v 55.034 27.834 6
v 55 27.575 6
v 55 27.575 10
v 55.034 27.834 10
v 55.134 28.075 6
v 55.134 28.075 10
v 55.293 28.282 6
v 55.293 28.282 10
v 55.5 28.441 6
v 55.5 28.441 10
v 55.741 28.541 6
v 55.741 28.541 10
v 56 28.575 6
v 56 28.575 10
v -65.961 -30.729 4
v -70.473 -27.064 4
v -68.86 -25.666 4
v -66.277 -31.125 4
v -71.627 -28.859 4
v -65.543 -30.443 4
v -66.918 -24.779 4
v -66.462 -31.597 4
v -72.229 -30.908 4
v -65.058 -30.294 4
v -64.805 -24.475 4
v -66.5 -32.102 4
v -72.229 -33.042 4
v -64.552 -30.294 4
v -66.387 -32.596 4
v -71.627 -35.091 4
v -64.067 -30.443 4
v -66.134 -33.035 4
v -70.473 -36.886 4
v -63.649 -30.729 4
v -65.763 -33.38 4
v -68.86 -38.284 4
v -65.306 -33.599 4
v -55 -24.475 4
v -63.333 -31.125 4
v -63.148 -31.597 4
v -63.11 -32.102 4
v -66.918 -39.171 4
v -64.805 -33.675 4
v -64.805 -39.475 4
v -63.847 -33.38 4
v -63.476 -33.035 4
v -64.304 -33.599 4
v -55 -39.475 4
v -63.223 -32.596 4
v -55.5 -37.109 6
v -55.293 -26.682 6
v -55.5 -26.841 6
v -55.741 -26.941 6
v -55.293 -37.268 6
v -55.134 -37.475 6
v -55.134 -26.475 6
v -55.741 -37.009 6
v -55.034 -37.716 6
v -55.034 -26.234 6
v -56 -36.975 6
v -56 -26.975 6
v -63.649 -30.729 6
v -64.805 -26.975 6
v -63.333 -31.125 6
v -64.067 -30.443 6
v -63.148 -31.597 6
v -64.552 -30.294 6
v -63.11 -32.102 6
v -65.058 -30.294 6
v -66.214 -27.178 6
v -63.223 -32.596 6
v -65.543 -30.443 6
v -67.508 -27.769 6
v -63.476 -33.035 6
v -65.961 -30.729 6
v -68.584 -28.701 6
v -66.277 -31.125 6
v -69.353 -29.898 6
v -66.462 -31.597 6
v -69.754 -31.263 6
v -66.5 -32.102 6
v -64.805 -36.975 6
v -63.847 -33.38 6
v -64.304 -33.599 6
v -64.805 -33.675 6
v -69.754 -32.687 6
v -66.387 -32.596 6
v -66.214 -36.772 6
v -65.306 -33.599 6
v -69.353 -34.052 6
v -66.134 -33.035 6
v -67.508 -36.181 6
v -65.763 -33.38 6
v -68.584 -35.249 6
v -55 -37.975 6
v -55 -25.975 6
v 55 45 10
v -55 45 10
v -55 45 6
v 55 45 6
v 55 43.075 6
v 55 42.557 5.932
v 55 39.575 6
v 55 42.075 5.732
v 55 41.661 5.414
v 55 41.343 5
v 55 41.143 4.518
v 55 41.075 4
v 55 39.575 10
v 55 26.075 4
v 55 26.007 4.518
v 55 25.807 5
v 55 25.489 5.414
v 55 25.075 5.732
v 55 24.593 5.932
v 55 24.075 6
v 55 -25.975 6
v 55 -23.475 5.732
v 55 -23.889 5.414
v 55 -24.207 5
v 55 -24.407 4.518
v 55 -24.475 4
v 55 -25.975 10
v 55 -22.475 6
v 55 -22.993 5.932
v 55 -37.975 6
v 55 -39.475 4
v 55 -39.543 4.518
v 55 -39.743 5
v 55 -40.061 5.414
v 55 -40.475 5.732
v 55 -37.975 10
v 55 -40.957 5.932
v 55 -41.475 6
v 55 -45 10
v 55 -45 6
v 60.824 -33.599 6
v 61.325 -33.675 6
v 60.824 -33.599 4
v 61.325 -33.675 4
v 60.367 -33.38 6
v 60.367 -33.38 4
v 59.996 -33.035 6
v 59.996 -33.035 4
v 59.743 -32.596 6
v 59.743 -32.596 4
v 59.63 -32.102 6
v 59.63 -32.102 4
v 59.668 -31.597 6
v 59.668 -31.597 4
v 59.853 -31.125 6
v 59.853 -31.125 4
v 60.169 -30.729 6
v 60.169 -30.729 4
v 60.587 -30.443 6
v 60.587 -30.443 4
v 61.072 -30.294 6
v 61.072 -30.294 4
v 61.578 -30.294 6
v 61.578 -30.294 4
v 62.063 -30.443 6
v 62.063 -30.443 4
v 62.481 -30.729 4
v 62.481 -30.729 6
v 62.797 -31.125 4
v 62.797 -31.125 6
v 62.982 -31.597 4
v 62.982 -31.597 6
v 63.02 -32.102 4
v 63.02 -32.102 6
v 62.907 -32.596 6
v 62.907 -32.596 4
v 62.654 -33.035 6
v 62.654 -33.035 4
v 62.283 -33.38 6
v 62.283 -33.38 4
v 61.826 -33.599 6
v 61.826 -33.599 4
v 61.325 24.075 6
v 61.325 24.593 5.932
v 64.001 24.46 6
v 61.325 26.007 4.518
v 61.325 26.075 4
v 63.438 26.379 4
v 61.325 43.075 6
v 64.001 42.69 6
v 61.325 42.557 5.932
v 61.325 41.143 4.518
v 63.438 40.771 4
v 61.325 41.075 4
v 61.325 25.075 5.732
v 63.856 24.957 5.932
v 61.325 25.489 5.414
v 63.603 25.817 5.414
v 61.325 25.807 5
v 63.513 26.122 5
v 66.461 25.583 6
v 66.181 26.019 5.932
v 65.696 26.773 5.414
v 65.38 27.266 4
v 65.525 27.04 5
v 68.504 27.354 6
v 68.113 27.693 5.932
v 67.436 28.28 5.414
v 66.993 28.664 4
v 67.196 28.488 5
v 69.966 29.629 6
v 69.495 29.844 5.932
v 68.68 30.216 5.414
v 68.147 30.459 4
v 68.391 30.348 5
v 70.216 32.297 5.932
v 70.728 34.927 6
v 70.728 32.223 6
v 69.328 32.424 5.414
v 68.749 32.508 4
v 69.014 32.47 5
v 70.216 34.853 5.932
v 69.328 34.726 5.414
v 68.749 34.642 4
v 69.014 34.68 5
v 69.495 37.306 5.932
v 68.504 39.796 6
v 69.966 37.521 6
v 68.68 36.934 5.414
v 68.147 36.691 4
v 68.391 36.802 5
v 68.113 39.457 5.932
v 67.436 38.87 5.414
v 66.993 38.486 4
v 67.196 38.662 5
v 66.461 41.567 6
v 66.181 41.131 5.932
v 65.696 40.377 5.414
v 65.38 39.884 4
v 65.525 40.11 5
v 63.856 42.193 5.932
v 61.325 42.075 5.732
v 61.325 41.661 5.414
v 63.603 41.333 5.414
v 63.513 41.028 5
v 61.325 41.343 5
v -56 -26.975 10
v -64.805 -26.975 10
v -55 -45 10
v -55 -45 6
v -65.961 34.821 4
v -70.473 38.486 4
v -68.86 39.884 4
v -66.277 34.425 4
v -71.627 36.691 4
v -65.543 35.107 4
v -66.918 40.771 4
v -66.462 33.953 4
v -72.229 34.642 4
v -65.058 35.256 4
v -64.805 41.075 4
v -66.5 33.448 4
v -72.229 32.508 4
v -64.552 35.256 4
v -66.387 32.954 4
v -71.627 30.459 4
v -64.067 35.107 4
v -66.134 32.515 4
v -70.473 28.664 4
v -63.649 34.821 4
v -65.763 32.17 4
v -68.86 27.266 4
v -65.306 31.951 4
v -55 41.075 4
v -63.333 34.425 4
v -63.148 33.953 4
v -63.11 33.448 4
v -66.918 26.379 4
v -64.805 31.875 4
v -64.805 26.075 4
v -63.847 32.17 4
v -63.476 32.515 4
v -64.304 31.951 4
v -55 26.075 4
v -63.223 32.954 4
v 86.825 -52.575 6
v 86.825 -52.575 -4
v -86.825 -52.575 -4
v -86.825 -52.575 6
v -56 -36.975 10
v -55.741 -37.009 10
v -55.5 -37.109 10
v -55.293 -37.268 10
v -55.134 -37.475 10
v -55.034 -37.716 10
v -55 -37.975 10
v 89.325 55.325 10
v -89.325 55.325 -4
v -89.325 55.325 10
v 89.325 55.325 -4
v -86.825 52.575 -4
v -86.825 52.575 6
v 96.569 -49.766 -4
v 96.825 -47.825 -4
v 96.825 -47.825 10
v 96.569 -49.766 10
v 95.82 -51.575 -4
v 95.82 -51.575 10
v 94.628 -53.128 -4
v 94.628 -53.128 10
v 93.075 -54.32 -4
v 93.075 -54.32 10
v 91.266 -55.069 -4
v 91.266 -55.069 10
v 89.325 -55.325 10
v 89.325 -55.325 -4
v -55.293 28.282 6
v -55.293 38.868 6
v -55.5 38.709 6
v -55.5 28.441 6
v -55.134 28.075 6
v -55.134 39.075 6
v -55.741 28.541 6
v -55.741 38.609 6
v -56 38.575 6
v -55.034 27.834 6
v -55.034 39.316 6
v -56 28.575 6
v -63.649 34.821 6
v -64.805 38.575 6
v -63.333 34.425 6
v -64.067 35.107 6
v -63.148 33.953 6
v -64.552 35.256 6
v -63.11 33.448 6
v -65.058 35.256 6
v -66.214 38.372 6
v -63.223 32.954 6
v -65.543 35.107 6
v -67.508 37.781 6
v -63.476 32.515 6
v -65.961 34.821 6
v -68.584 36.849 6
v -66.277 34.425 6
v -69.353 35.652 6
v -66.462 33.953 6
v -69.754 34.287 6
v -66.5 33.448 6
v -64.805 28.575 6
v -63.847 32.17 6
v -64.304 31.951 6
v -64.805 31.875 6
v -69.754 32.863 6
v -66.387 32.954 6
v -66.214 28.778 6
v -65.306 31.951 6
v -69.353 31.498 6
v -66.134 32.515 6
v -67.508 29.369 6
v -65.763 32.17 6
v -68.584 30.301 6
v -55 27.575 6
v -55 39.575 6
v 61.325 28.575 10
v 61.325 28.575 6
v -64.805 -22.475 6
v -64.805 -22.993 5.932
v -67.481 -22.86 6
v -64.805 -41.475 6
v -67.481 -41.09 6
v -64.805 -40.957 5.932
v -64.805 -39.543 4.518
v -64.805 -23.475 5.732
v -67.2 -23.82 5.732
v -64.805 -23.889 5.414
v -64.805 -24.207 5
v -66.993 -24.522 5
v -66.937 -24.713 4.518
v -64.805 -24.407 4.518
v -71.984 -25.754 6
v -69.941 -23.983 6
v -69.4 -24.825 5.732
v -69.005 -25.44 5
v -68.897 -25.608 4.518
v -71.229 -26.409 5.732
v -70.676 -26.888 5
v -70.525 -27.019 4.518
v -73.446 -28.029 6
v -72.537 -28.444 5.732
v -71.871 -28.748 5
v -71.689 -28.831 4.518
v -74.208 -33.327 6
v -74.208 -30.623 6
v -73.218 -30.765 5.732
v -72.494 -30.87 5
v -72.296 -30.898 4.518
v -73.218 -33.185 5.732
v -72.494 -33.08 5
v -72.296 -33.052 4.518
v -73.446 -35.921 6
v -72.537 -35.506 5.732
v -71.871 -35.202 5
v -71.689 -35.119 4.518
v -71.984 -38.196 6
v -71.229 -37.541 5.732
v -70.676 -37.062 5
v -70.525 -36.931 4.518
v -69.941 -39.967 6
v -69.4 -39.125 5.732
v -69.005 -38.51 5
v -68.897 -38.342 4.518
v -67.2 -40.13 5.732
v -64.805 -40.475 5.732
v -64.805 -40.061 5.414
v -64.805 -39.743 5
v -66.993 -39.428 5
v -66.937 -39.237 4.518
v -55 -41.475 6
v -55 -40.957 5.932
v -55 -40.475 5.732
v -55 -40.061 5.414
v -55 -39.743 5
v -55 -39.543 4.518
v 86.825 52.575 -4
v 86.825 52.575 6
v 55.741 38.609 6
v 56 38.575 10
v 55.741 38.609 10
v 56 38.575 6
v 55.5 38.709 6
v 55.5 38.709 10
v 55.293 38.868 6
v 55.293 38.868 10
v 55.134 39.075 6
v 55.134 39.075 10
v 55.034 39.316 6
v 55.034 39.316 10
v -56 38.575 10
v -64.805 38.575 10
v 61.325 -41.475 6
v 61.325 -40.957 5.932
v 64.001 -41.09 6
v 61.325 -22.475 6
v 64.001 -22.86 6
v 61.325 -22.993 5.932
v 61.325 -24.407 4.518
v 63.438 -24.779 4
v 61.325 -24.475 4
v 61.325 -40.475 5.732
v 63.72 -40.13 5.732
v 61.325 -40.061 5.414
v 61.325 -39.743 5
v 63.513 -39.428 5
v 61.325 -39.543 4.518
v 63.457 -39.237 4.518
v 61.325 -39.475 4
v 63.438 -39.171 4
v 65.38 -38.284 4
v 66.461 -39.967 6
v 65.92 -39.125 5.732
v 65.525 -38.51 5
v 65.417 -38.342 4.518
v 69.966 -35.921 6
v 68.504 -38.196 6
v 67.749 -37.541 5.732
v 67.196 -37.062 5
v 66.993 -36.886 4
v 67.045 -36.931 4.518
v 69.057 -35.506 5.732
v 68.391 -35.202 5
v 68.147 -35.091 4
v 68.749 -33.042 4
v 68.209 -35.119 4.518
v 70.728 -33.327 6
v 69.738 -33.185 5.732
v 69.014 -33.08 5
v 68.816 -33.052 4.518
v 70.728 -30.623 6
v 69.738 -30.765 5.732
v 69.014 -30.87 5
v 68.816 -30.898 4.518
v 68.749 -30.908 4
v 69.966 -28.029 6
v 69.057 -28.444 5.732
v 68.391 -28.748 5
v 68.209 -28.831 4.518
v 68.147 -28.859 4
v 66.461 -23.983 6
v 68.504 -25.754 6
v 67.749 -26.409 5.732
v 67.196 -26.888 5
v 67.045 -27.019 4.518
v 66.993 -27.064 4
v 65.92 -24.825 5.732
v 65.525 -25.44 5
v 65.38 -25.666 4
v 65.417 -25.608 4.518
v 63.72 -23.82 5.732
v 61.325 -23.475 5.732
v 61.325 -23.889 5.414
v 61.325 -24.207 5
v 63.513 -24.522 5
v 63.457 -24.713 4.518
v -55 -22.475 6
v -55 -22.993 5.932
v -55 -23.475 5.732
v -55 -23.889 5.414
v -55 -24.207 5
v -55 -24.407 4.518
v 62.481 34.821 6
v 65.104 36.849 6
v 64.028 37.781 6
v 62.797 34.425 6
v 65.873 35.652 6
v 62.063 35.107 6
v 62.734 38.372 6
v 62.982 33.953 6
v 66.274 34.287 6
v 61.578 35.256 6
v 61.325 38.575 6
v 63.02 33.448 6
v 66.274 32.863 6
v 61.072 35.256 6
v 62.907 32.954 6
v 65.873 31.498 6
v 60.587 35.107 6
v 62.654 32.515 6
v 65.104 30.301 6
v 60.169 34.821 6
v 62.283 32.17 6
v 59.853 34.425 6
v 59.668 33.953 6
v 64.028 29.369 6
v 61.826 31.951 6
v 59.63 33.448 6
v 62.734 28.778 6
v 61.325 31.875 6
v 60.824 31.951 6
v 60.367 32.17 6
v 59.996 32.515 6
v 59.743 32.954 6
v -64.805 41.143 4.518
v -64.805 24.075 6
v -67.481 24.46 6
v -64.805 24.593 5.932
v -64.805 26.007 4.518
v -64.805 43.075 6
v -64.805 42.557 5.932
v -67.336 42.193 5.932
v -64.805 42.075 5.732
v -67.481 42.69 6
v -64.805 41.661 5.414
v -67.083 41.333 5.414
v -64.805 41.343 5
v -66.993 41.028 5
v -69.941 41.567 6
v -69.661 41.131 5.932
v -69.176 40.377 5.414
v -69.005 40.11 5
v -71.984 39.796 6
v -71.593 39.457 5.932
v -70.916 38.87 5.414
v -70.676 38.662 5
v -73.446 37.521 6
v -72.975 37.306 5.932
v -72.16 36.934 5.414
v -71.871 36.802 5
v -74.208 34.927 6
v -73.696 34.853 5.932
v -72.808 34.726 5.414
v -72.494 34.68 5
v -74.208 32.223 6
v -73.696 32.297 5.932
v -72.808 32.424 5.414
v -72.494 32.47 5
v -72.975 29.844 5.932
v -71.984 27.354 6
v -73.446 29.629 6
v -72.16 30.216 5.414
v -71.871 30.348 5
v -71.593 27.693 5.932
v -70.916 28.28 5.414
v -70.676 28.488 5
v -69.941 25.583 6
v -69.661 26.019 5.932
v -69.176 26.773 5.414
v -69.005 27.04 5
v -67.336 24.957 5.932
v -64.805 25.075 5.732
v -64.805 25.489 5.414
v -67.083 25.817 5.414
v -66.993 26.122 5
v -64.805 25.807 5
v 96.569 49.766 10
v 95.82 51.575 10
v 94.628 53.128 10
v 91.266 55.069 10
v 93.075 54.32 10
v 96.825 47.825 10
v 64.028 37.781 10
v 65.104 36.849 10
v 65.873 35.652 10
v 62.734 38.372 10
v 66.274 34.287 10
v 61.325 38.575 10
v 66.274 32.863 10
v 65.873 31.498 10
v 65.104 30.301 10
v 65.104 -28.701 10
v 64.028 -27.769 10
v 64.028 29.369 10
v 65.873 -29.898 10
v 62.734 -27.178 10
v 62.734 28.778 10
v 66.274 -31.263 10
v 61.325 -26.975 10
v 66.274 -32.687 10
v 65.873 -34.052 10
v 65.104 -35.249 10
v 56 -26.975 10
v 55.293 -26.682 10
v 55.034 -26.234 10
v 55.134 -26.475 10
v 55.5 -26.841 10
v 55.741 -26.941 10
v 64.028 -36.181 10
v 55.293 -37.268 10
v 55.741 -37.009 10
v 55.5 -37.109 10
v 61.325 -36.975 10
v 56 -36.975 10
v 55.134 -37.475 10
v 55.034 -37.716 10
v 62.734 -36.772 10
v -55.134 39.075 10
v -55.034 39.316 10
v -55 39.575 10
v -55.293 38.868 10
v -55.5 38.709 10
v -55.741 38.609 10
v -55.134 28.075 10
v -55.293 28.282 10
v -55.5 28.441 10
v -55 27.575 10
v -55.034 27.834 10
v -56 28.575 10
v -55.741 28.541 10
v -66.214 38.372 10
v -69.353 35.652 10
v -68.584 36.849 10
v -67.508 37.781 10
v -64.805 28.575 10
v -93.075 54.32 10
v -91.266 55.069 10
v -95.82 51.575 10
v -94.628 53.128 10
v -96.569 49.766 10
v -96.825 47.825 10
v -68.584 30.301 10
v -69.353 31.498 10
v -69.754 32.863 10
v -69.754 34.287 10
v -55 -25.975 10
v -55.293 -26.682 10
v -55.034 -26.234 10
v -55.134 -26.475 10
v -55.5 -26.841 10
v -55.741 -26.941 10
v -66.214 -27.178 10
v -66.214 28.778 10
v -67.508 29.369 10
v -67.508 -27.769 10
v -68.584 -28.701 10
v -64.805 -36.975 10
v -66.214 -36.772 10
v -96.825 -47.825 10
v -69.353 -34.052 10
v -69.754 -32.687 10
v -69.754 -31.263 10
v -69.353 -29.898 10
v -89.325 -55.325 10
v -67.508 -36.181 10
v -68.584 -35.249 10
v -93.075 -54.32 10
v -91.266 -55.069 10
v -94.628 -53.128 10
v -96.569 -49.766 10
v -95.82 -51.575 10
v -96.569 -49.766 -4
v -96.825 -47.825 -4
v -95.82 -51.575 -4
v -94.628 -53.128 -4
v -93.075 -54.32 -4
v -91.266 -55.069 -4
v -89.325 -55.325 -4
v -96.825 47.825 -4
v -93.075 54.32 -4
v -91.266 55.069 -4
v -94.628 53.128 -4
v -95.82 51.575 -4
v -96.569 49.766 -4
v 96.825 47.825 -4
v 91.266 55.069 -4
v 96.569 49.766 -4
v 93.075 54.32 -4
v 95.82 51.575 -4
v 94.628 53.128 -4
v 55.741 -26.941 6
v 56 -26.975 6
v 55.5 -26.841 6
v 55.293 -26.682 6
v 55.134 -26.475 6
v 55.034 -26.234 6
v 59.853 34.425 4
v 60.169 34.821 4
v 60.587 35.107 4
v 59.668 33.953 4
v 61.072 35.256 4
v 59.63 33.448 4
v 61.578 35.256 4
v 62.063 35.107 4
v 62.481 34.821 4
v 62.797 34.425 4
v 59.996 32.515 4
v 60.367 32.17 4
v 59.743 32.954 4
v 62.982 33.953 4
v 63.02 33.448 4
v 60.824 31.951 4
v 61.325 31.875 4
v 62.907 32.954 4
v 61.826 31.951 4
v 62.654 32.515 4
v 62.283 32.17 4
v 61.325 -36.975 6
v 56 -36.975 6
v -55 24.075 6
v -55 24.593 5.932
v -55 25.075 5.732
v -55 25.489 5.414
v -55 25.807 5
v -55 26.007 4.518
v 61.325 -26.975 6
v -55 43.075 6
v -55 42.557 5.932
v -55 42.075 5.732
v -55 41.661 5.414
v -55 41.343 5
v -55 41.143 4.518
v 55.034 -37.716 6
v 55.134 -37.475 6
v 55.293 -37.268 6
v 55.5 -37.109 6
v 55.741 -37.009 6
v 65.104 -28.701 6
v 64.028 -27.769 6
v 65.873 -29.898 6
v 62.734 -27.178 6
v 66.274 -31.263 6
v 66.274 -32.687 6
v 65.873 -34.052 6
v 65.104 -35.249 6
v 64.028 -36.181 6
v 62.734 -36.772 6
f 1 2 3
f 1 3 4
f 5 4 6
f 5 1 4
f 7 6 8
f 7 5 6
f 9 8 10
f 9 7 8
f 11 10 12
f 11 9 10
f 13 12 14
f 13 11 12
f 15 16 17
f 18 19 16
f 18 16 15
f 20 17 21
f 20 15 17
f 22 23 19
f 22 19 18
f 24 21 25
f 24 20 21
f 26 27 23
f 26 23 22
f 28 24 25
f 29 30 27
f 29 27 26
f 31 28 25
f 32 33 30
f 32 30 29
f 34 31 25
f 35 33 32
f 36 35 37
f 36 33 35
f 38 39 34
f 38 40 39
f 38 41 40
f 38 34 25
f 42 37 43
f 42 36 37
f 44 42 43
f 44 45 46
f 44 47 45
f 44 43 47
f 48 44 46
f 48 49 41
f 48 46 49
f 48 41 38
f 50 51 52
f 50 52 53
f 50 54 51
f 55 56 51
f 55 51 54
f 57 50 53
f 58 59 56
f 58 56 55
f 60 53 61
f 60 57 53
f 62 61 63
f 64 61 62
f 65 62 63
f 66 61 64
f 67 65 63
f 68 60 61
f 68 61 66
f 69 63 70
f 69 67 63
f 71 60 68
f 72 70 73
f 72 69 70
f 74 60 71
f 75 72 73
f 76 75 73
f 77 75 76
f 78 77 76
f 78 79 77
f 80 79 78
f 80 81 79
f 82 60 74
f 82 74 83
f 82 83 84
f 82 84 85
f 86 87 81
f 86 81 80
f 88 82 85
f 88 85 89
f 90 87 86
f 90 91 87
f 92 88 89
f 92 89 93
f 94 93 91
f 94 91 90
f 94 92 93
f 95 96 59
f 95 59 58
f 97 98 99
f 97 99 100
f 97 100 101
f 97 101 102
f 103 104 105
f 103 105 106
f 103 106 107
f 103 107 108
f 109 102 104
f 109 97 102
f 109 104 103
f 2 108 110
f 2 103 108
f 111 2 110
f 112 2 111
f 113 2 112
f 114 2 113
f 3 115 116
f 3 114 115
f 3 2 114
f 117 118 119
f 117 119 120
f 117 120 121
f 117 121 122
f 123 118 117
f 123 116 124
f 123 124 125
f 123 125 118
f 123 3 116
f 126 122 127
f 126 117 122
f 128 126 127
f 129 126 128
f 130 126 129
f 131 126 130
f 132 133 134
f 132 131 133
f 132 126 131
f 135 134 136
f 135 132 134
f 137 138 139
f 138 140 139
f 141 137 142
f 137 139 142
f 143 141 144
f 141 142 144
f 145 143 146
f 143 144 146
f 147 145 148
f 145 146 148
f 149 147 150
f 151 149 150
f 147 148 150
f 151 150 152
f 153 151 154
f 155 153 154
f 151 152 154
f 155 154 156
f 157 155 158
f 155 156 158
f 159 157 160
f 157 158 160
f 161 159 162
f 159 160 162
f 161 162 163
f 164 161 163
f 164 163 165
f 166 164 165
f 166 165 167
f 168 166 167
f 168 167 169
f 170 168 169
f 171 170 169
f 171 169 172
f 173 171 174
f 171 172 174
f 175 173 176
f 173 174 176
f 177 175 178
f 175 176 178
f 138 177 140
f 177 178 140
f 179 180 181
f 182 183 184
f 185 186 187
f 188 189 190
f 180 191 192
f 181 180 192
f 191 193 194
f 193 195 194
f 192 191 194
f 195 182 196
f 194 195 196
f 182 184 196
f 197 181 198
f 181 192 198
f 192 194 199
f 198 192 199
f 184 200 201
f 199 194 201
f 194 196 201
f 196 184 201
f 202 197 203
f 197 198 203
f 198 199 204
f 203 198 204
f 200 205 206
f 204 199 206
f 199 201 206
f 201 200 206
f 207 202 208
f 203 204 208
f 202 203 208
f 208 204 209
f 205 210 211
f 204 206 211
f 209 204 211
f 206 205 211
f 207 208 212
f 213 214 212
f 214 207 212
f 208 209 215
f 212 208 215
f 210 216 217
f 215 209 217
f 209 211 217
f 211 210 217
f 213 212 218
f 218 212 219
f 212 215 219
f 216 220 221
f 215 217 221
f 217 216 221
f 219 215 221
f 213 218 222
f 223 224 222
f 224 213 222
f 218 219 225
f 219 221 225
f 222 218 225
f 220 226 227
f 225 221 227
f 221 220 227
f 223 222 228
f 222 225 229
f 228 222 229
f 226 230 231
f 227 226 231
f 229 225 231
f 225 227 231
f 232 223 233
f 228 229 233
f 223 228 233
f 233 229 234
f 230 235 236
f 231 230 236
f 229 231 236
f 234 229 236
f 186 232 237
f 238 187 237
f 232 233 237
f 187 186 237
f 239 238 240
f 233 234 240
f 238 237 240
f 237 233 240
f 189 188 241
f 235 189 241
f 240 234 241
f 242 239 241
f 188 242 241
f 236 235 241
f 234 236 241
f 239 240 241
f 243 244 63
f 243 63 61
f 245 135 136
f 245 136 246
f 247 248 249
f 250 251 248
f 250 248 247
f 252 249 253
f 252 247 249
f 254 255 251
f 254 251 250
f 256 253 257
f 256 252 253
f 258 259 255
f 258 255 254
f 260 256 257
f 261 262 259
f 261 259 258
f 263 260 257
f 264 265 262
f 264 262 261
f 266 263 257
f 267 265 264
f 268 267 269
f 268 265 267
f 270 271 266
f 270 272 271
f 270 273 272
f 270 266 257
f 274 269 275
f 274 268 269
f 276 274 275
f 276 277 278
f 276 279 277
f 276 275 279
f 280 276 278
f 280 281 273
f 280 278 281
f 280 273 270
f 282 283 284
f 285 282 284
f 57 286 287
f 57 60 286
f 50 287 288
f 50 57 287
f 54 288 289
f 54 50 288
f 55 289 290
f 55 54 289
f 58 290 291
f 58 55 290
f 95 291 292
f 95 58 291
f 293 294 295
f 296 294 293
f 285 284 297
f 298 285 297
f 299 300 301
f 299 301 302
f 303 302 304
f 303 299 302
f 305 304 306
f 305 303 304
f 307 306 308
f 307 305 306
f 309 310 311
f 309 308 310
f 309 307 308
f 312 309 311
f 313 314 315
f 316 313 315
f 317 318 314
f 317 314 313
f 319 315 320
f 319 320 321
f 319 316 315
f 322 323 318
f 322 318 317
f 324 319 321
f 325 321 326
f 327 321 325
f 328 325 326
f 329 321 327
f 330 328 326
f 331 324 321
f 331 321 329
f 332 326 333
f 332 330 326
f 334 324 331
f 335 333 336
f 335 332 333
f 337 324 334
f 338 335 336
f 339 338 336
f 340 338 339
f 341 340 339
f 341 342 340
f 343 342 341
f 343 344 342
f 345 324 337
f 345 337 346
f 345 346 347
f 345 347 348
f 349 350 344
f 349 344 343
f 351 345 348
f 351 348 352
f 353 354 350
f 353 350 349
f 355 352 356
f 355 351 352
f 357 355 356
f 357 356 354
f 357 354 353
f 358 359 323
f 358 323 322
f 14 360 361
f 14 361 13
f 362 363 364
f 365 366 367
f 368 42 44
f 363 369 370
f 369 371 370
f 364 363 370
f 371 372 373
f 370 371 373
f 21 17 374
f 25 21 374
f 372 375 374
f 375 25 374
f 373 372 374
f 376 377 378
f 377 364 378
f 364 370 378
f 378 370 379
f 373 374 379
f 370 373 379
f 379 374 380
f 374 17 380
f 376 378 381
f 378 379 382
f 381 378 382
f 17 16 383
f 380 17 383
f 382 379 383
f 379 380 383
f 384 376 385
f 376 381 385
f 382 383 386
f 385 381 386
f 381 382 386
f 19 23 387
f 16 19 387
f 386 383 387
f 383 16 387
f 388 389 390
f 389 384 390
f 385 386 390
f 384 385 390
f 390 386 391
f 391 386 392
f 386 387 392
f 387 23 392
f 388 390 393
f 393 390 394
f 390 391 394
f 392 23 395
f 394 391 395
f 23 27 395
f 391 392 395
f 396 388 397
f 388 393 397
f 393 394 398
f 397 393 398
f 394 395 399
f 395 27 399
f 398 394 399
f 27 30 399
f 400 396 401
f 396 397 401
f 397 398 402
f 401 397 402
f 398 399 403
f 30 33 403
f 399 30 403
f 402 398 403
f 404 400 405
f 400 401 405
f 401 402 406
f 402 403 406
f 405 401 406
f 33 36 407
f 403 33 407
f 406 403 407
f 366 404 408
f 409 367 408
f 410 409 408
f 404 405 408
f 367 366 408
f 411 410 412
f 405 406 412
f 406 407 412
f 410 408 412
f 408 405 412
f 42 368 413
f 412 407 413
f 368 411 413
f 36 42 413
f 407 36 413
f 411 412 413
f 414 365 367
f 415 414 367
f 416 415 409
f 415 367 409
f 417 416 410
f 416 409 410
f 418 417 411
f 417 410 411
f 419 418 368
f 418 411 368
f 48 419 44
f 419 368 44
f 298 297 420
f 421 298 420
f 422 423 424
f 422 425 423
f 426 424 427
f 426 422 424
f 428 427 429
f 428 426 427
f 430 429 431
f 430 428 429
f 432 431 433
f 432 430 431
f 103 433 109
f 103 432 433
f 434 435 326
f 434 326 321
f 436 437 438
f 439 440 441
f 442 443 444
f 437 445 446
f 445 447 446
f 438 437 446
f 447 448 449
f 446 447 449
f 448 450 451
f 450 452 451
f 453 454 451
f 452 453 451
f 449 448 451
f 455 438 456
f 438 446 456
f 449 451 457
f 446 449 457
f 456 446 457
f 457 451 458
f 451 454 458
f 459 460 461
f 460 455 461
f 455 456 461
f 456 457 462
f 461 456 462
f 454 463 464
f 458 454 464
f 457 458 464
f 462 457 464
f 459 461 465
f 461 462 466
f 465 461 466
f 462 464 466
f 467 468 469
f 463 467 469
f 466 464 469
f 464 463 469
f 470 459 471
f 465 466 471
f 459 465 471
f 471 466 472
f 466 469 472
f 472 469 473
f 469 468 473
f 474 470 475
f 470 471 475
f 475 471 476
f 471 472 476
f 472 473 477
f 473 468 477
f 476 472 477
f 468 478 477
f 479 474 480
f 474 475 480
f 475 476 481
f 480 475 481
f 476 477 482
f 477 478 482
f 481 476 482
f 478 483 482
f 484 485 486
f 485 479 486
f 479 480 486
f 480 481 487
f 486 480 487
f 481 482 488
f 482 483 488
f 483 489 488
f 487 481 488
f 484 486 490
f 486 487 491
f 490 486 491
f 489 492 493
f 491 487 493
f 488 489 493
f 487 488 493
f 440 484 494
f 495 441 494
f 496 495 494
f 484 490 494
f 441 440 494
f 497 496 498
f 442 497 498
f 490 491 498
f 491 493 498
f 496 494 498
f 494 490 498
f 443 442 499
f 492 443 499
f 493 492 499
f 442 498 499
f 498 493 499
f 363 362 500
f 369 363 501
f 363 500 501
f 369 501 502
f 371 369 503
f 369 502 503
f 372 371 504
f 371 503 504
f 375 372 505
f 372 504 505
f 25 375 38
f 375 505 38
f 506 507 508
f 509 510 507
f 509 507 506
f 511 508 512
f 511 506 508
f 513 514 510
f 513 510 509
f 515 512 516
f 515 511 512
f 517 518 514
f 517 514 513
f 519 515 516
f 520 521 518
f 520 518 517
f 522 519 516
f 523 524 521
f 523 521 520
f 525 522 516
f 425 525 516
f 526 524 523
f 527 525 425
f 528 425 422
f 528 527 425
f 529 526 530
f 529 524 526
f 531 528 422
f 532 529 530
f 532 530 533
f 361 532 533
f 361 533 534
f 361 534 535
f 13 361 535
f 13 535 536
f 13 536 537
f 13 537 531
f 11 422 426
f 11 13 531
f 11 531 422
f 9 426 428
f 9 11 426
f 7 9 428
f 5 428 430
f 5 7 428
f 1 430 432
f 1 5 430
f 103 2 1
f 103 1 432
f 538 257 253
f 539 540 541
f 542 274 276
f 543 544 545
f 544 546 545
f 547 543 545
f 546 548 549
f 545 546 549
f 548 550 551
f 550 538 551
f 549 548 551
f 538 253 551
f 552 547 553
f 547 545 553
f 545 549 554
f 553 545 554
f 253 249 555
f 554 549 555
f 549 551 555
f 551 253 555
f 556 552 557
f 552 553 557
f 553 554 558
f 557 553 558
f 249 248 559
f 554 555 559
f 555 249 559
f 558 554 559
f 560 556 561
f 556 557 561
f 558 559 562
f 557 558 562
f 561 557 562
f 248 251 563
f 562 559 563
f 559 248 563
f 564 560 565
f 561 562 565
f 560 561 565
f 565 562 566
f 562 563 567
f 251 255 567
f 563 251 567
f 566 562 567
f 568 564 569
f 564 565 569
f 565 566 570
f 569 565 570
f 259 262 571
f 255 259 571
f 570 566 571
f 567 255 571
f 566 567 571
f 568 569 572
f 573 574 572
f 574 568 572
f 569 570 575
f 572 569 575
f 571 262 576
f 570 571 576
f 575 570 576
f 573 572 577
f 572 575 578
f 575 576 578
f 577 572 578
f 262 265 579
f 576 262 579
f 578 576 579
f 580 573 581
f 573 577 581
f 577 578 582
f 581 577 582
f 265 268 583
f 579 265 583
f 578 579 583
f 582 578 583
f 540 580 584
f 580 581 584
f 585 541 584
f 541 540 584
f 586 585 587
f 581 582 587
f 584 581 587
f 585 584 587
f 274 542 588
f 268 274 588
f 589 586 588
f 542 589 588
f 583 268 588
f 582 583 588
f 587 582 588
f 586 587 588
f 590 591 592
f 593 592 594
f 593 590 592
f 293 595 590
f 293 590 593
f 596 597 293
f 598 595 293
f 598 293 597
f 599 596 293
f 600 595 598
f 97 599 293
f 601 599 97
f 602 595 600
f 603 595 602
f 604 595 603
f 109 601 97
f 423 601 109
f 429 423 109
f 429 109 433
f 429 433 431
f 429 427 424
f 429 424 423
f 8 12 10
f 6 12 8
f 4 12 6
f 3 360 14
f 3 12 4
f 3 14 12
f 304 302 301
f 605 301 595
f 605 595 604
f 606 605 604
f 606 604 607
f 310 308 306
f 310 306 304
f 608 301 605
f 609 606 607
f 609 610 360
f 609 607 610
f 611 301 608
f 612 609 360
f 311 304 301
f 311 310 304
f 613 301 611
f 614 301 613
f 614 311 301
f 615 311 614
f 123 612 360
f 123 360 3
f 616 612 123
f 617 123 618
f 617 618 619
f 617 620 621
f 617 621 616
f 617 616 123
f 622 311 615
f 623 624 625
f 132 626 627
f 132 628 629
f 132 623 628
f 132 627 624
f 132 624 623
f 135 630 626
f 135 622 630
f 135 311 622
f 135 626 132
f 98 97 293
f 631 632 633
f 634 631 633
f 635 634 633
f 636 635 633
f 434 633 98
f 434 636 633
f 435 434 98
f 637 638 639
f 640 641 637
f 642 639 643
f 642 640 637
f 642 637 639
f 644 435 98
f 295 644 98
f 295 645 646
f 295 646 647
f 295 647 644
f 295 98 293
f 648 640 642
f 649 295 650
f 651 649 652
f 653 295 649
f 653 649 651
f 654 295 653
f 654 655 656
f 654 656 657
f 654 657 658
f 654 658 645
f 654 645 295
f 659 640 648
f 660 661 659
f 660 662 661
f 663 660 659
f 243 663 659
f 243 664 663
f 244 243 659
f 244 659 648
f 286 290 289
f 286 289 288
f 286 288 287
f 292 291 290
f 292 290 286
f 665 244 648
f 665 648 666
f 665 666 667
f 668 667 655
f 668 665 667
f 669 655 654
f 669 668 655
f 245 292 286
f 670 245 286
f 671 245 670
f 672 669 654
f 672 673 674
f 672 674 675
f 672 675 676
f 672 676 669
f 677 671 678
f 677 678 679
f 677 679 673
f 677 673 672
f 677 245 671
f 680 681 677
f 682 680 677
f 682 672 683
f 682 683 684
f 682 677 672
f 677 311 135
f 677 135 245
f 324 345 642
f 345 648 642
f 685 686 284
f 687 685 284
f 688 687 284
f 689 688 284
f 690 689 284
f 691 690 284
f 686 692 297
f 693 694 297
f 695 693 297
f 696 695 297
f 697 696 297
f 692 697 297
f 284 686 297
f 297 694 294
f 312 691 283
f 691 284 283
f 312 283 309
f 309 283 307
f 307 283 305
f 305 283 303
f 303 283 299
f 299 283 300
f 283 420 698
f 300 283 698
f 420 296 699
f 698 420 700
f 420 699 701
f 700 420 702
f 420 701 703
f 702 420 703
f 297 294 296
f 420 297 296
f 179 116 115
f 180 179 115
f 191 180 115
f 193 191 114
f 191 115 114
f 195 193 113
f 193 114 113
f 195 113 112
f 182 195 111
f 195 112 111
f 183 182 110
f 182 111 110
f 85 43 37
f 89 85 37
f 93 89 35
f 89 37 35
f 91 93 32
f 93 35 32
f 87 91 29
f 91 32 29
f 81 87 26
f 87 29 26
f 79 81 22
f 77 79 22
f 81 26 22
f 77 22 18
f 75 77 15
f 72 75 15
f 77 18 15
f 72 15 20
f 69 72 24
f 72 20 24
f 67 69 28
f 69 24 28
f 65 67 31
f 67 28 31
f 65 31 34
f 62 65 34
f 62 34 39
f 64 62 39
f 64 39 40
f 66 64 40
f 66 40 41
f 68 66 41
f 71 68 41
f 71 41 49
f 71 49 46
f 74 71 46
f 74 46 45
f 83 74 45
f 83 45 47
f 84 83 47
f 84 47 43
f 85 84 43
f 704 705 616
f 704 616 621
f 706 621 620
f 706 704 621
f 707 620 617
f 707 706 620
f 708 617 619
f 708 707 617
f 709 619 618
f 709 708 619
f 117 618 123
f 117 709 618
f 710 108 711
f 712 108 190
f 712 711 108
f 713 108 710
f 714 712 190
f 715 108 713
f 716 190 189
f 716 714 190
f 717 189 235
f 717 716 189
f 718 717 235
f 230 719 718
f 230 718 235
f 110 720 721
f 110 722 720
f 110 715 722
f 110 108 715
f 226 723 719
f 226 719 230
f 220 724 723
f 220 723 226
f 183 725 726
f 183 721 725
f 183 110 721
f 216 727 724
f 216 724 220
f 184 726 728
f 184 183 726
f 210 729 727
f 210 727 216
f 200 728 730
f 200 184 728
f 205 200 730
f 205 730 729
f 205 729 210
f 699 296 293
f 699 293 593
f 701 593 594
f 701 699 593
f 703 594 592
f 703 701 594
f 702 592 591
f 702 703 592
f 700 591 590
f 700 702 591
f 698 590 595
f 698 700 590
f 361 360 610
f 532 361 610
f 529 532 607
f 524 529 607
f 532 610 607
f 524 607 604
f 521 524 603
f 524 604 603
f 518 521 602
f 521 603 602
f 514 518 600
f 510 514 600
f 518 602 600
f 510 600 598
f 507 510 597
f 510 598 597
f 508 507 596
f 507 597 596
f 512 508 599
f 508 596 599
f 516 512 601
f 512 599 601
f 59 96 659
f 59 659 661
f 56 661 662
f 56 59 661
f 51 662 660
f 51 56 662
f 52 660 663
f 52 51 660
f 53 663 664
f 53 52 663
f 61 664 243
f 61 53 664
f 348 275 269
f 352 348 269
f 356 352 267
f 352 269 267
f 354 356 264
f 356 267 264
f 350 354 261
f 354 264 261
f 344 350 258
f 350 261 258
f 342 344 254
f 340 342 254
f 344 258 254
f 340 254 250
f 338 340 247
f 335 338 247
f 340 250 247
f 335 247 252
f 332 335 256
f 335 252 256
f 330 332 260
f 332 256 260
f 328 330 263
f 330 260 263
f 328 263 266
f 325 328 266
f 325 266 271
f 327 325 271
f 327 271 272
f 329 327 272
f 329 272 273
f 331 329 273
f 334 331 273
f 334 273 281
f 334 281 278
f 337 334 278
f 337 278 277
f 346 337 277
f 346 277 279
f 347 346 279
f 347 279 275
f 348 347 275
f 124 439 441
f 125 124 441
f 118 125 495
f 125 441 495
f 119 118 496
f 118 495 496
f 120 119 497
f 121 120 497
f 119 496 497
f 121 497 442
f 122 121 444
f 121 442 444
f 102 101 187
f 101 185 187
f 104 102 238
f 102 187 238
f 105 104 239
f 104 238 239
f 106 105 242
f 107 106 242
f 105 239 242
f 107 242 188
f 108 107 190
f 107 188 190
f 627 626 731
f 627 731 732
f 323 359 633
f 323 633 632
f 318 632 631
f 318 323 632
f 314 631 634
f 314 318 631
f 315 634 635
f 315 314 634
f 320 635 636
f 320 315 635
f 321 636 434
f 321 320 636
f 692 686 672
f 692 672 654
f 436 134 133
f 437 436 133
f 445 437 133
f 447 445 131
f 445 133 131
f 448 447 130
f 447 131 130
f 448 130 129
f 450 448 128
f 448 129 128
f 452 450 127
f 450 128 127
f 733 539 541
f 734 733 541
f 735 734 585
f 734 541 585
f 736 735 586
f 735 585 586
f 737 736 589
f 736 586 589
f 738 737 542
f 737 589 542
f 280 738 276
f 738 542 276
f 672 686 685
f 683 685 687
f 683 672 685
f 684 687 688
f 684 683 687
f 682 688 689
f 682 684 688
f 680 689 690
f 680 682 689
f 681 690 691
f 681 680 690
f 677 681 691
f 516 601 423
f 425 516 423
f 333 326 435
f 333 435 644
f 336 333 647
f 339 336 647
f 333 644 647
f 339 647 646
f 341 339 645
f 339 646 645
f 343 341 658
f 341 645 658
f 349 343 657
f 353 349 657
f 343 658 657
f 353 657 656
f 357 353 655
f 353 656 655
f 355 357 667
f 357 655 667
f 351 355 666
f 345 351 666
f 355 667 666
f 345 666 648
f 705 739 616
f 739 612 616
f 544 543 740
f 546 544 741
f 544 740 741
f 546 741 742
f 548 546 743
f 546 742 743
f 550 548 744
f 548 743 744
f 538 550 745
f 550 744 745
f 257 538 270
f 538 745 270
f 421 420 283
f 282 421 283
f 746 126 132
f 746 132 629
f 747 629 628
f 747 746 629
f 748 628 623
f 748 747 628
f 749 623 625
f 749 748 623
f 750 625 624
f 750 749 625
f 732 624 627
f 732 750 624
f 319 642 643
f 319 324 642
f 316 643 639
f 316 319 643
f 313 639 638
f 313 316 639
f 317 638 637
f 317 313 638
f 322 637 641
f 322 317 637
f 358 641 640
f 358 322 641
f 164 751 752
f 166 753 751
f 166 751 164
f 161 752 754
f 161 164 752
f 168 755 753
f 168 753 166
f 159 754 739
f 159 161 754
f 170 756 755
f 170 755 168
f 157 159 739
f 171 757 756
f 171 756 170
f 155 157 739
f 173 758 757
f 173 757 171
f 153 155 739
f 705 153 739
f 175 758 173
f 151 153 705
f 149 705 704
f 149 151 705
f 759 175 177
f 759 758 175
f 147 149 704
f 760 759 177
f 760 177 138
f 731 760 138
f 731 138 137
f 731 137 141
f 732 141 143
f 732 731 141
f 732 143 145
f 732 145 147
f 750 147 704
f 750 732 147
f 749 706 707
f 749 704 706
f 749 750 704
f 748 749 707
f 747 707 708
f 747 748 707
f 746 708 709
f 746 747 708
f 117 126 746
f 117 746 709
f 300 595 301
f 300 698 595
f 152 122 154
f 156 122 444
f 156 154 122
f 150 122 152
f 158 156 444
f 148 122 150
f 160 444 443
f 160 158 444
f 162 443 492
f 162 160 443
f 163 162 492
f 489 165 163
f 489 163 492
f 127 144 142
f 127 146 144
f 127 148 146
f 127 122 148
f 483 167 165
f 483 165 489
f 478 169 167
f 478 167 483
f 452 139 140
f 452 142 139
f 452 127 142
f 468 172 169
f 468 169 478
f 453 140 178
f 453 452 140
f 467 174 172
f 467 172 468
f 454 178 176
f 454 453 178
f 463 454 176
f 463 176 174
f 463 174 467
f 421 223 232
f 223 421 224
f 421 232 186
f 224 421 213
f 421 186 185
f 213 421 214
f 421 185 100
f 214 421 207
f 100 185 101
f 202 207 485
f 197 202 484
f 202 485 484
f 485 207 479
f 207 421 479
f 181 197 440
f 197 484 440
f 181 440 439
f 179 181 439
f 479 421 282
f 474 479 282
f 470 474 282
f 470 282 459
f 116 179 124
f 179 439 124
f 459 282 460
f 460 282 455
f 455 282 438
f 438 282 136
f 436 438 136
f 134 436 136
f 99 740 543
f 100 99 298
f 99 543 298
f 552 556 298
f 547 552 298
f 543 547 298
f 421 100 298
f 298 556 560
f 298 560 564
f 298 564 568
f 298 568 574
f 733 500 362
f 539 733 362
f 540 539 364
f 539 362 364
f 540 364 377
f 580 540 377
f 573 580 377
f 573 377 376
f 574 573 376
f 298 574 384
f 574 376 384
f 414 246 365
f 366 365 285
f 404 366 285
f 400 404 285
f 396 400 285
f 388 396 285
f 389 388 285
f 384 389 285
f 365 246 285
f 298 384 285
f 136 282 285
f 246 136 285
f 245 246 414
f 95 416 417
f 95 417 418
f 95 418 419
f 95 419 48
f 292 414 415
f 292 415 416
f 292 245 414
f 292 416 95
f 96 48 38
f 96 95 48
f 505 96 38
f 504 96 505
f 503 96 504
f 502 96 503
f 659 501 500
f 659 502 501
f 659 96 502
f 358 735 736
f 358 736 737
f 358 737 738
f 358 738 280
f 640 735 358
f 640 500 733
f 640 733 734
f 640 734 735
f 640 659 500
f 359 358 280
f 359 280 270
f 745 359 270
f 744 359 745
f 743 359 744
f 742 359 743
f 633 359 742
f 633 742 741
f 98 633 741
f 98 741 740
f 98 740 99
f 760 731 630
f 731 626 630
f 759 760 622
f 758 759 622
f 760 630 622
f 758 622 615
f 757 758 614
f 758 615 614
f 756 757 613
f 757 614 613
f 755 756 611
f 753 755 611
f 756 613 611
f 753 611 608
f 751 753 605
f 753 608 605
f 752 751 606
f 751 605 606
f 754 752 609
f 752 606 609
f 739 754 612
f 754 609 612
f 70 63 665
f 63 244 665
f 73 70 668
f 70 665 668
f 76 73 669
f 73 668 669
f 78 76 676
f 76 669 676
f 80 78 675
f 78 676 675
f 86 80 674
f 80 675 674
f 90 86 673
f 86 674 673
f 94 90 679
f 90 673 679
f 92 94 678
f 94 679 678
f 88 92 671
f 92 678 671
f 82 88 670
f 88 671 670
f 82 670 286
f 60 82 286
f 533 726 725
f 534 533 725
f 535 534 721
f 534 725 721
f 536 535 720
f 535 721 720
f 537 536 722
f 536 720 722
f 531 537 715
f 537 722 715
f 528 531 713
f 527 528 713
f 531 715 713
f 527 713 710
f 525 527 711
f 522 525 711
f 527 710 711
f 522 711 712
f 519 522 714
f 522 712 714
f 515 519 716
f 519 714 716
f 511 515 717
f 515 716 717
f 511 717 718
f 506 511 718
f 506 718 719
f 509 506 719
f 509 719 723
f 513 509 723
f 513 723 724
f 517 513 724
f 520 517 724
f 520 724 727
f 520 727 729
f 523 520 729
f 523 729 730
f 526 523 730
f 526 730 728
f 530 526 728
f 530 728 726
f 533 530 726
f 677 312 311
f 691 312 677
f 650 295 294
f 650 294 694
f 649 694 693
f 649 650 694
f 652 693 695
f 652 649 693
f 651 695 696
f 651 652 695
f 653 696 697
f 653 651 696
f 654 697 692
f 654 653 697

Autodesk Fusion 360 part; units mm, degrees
sketch "Sketch1" plane through (0, 0, 0) normal (0, 0, 1) x (1, 0, 0)
  line L0 (-96.825, 55.325) -> (96.825, 55.325)
  line L1 (96.825, 55.325) -> (96.825, -55.325)
  line L2 (96.825, -55.325) -> (-96.825, -55.325)
  line L3 (-96.825, -55.325) -> (-96.825, 55.325)
  line L4 (-86.825, 52.575) -> (86.825, 52.575)
  line L5 (86.825, 52.575) -> (86.825, -52.575)
  line L6 (86.825, -52.575) -> (-86.825, -52.575)
  line L7 (-86.825, -52.575) -> (-86.825, 52.575)
  point P0 (0, 55.325)
  point P1 (96.825, 0)
  point P2 (0, 52.575)
  point P3 (86.825, 0)
  dimension "d1" = 193.65
  dimension "d2" = 110.65
  dimension "d9" = 2.75
  dimension "d10" = 10
extrude "Extrude2" add sketch "Sketch1" along normal mid plane 8
fillet "Fillet1" radius 7.5 4 edges at (-96.825, 55.325, 0) (-96.825, -55.325, 0) (96.825, -55.325, 0) (96.825, 55.325, 0)
sketch "Sketch2" plane through (0, 0, 4) normal (0, 0, 1) x (-1, 0, 0)
  arc A0 (-96.825, -47.825) -> (-89.325, -55.325) centre (-89.325, -47.825) ccw
  line L0 (-89.325, -55.325) -> (89.325, -55.325)
  arc A1 (89.325, -55.325) -> (96.825, -47.825) centre (89.325, -47.825) ccw
  line L1 (96.825, -47.825) -> (96.825, 47.825)
  arc A2 (96.825, 47.825) -> (89.325, 55.325) centre (89.325, 47.825) ccw
  line L2 (89.325, 55.325) -> (-89.325, 55.325)
  arc A3 (-89.325, 55.325) -> (-96.825, 47.825) centre (-89.325, 47.825) ccw
  line L3 (-96.825, 47.825) -> (-96.825, -47.825)
  line L4 (-86.825, 52.575) -> (86.825, 52.575)
  line L5 (86.825, 52.575) -> (86.825, -52.575)
  line L6 (86.825, -52.575) -> (-86.825, -52.575)
  line L7 (-86.825, -52.575) -> (-86.825, 52.575)
  line L8 (96.825, -47.825) -> (96.825, 47.825)
  arc A4 (96.825, 47.825) -> (89.325, 55.325) centre (89.325, 47.825) ccw
  line L9 (89.325, 55.325) -> (-89.325, 55.325)
  arc A5 (-89.325, 55.325) -> (-96.825, 47.825) centre (-89.325, 47.825) ccw
  line L10 (-96.825, 47.825) -> (-96.825, -47.825)
  arc A6 (-96.825, -47.825) -> (-89.325, -55.325) centre (-89.325, -47.825) ccw
  line L11 (-89.325, -55.325) -> (89.325, -55.325)
  arc A7 (89.325, -55.325) -> (96.825, -47.825) centre (89.325, -47.825) ccw
extrude "Extrude3" add sketch "Sketch2" along normal blind 6 contours A0 L0 A1 L1 A2 L2 A3 L3 L8 A4 L9 A5 L10 A6 L11 A7 | L4 L5 L6 L7
sketch "Sketch3" plane through (0, 0, 10) normal (0, 0, 1) x (-1, 0, 0)
  arc A0 (89.325, -55.325) -> (96.825, -47.825) centre (89.325, -47.825) ccw
  line L0 (96.825, -47.825) -> (96.825, 47.825)
  arc A1 (96.825, 47.825) -> (89.325, 55.325) centre (89.325, 47.825) ccw
  line L1 (89.325, 55.325) -> (-89.325, 55.325)
  arc A2 (-89.325, 55.325) -> (-96.825, 47.825) centre (-89.325, 47.825) ccw
  line L2 (-96.825, 47.825) -> (-96.825, -47.825)
  arc A3 (-96.825, -47.825) -> (-89.325, -55.325) centre (-89.325, -47.825) ccw
  line L3 (-89.325, -55.325) -> (89.325, -55.325)
  line L4 (72.305, -37.575) -> (-68.825, -37.575) construction
  line L5 (-68.825, -37.575) -> (-68.825, 35.975) construction
  line L6 (-68.825, 35.975) -> (72.305, 35.975) construction
  line L7 (72.305, 35.975) -> (72.305, -37.575) construction
  point P0 (-61.325, -33.575)
  point P1 (-61.325, 31.975)
  point P2 (64.805, -33.575)
  point P3 (64.805, 31.975)
  dimension "d17" = 73.55
  dimension "d18" = 4
  dimension "d19" = 4
  dimension "d20" = 141.13
  dimension "d21" = 7.5
  dimension "d22" = 7.5
  dimension "d23" = 4
  dimension "d24" = 7.5
  dimension "d25" = 4
  dimension "d26" = 7.5
  dimension "d27" = 28
  dimension "d28" = 17.75
extrude "Extrude5" cut 1 faces at (28.9417, -17.525, 4) along direction (0, 0, 1) blind 2
sketch "Sketch4" plane through (0, 0, 10) normal (0, 0, 1) x (-1, 0, 0)
  arc A0 (89.325, -55.325) -> (96.825, -47.825) centre (89.325, -47.825) ccw
  line L0 (96.825, -47.825) -> (96.825, 47.825)
  arc A1 (96.825, 47.825) -> (89.325, 55.325) centre (89.325, 47.825) ccw
  line L1 (89.325, 55.325) -> (-89.325, 55.325)
  arc A2 (-89.325, 55.325) -> (-96.825, 47.825) centre (-89.325, 47.825) ccw
  line L2 (-96.825, 47.825) -> (-96.825, -47.825)
  arc A3 (-96.825, -47.825) -> (-89.325, -55.325) centre (-89.325, -47.825) ccw
  line L3 (-89.325, -55.325) -> (89.325, -55.325)
  line L4 (55, -45) -> (-55, -45)
  line L5 (-55, -45) -> (-55, 45)
  line L6 (-55, 45) -> (55, 45)
  line L7 (55, 45) -> (55, -45)
  point P0 (0, -45)
  dimension "d33" = 110
  dimension "d35" = 45
  dimension "d36" = 45
extrude "Extrude4" cut sketch "Sketch4" against normal through all contours L4 L5 L6 L7
sketch "Sketch5" plane through (0, 0, 6) normal (0, 0, -1) x (1, 0, 0)
  line L0 (86.825, -52.575) -> (86.825, 52.575)
  line L1 (86.825, 52.575) -> (-86.825, 52.575)
  line L2 (-86.825, 52.575) -> (-86.825, -52.575)
  line L3 (-86.825, -52.575) -> (86.825, -52.575)
  circle A0 centre (61.325, -33.575) radius 7.5
  circle A1 centre (61.325, 31.975) radius 7.5
  circle A2 centre (-64.805, -33.575) radius 7.5
  circle A3 centre (-64.805, 31.975) radius 7.5
  line L4 (-55, -45) -> (-55, 45)
  line L5 (-55, 45) -> (55, 45)
  line L6 (55, 45) -> (55, -45)
  line L7 (55, -45) -> (-55, -45)
  line L8 (-64.805, -26.075) -> (-55, -26.075)
  line L9 (-64.805, -41.075) -> (-55, -41.075)
  line L10 (-64.805, 39.475) -> (-55, 39.475)
  line L11 (-64.805, 24.475) -> (-55, 24.475)
  line L12 (61.325, 39.475) -> (55, 39.475)
  line L13 (61.325, 24.475) -> (55, 24.475)
  line L14 (61.325, -26.075) -> (55, -26.075)
  line L15 (61.325, -41.075) -> (55, -41.075)
  point P0 (61.325, -33.575)
  point P1 (-64.805, -33.575)
  point P2 (-64.805, 31.975)
  point P3 (61.325, 31.975)
  dimension "d39" = 15
  dimension "d47" = 126.13
extrude "Extrude6" add sketch "Sketch5" along normal blind 2 contours A0 L6 | A0 L6 L14 | A0 L6 L15 | A1 L6 L13 | A1 L6 | A1 L6 L12 | A2 L4 L8 L9 | A2 | A3 L4 L10 L11 | A3 picked at (59.7964, -33.5066) picked at (59.5829, 32.3308)
sketch "Sketch6" plane through (0, 0, 10) normal (0, 0, 1) x (-1, 0, 0)
  line L0 (55, 45) -> (55, -45)
  line L1 (55, -45) -> (-55, -45)
  line L2 (-55, -45) -> (-55, 45)
  line L3 (-55, 45) -> (55, 45)
  arc A0 (89.325, -55.325) -> (96.825, -47.825) centre (89.325, -47.825) ccw
  line L4 (96.825, -47.825) -> (96.825, 47.825)
  arc A1 (96.825, 47.825) -> (89.325, 55.325) centre (89.325, 47.825) ccw
  line L5 (89.325, 55.325) -> (-89.325, 55.325)
  arc A2 (-89.325, 55.325) -> (-96.825, 47.825) centre (-89.325, 47.825) ccw
  line L6 (-96.825, 47.825) -> (-96.825, -47.825)
  arc A3 (-96.825, -47.825) -> (-89.325, -55.325) centre (-89.325, -47.825) ccw
  line L7 (-89.325, -55.325) -> (89.325, -55.325)
  circle A4 centre (64.805, -33.575) radius 5
  circle A5 centre (64.805, 31.975) radius 5
  circle A6 centre (-61.325, -33.575) radius 5
  circle A7 centre (-61.325, 31.975) radius 5
  line L8 (64.805, -38.575) -> (55, -38.575)
  line L9 (64.805, -28.575) -> (55, -28.575)
  line L10 (64.805, 26.975) -> (55, 26.975)
  line L11 (64.805, 36.975) -> (55, 36.975)
  line L12 (-61.325, 36.975) -> (-55, 36.975)
  line L13 (-61.325, 26.975) -> (-55, 26.975)
  line L14 (-61.325, -28.575) -> (-55, -28.575)
  line L15 (-61.325, -38.575) -> (-55, -38.575)
  point P0 (64.805, -33.575)
  point P1 (64.805, 31.975)
  point P2 (-61.325, 31.975)
  point P3 (-61.325, -33.575)
  dimension "d44" = 10
extrude "Extrude7" cut sketch "Sketch6" against normal blind 4 contours L0 A5 L10 L11 | A5 | L2 A7 L12 L13 | L0 A4 L8 L9 | A7 | A4 | L2 A6 L14 L15 | A6
hole "Hole1" at (-64.805, 33.575, 10) at (61.325, 33.575, 10) at (61.325, -31.975, 10) at (-64.805, -31.975, 10) direction (0, 0, -1) diameter 3.4 end through all counterbore diameter 6.5 counterbore depth 3
fillet "Fillet3" radius 1 8 edges at (-55, 28.575, 8) (-55, 38.575, 8) (55, 38.575, 8) (55, 28.575, 8) (55, -26.975, 8) (55, -36.975, 8) (-55, -26.975, 8) (-55, -36.975, 8)
fillet "Fillet4" radius 2 12 edges at (-59.9025, -24.475, 6) (-72.305, -31.975, 6) (-59.9025, -39.475, 6) (-59.9025, 41.075, 6) (-72.305, 33.575, 6) (-59.9025, 26.075, 6) (58.1625, 26.075, 6) (68.825, 33.575, 6) (58.1625, 41.075, 6) (58.1625, -39.475, 6) (68.825, -31.975, 6) (58.1625, -24.475, 6)
equation "d1 = 193.75 mm - 0.1 mm"
equation "d2 = 110.75 mm - 0.1 mm"
equation "d9 = 2.00 mm + 0.75 mm"
equation "d11 = 6 mm + 2 mm"
equation "d19 = d18"
equation "d22 = d21"
equation "d23 = d18"
equation "d24 = d21"
equation "d25 = d23"
equation "d26 = d24"
